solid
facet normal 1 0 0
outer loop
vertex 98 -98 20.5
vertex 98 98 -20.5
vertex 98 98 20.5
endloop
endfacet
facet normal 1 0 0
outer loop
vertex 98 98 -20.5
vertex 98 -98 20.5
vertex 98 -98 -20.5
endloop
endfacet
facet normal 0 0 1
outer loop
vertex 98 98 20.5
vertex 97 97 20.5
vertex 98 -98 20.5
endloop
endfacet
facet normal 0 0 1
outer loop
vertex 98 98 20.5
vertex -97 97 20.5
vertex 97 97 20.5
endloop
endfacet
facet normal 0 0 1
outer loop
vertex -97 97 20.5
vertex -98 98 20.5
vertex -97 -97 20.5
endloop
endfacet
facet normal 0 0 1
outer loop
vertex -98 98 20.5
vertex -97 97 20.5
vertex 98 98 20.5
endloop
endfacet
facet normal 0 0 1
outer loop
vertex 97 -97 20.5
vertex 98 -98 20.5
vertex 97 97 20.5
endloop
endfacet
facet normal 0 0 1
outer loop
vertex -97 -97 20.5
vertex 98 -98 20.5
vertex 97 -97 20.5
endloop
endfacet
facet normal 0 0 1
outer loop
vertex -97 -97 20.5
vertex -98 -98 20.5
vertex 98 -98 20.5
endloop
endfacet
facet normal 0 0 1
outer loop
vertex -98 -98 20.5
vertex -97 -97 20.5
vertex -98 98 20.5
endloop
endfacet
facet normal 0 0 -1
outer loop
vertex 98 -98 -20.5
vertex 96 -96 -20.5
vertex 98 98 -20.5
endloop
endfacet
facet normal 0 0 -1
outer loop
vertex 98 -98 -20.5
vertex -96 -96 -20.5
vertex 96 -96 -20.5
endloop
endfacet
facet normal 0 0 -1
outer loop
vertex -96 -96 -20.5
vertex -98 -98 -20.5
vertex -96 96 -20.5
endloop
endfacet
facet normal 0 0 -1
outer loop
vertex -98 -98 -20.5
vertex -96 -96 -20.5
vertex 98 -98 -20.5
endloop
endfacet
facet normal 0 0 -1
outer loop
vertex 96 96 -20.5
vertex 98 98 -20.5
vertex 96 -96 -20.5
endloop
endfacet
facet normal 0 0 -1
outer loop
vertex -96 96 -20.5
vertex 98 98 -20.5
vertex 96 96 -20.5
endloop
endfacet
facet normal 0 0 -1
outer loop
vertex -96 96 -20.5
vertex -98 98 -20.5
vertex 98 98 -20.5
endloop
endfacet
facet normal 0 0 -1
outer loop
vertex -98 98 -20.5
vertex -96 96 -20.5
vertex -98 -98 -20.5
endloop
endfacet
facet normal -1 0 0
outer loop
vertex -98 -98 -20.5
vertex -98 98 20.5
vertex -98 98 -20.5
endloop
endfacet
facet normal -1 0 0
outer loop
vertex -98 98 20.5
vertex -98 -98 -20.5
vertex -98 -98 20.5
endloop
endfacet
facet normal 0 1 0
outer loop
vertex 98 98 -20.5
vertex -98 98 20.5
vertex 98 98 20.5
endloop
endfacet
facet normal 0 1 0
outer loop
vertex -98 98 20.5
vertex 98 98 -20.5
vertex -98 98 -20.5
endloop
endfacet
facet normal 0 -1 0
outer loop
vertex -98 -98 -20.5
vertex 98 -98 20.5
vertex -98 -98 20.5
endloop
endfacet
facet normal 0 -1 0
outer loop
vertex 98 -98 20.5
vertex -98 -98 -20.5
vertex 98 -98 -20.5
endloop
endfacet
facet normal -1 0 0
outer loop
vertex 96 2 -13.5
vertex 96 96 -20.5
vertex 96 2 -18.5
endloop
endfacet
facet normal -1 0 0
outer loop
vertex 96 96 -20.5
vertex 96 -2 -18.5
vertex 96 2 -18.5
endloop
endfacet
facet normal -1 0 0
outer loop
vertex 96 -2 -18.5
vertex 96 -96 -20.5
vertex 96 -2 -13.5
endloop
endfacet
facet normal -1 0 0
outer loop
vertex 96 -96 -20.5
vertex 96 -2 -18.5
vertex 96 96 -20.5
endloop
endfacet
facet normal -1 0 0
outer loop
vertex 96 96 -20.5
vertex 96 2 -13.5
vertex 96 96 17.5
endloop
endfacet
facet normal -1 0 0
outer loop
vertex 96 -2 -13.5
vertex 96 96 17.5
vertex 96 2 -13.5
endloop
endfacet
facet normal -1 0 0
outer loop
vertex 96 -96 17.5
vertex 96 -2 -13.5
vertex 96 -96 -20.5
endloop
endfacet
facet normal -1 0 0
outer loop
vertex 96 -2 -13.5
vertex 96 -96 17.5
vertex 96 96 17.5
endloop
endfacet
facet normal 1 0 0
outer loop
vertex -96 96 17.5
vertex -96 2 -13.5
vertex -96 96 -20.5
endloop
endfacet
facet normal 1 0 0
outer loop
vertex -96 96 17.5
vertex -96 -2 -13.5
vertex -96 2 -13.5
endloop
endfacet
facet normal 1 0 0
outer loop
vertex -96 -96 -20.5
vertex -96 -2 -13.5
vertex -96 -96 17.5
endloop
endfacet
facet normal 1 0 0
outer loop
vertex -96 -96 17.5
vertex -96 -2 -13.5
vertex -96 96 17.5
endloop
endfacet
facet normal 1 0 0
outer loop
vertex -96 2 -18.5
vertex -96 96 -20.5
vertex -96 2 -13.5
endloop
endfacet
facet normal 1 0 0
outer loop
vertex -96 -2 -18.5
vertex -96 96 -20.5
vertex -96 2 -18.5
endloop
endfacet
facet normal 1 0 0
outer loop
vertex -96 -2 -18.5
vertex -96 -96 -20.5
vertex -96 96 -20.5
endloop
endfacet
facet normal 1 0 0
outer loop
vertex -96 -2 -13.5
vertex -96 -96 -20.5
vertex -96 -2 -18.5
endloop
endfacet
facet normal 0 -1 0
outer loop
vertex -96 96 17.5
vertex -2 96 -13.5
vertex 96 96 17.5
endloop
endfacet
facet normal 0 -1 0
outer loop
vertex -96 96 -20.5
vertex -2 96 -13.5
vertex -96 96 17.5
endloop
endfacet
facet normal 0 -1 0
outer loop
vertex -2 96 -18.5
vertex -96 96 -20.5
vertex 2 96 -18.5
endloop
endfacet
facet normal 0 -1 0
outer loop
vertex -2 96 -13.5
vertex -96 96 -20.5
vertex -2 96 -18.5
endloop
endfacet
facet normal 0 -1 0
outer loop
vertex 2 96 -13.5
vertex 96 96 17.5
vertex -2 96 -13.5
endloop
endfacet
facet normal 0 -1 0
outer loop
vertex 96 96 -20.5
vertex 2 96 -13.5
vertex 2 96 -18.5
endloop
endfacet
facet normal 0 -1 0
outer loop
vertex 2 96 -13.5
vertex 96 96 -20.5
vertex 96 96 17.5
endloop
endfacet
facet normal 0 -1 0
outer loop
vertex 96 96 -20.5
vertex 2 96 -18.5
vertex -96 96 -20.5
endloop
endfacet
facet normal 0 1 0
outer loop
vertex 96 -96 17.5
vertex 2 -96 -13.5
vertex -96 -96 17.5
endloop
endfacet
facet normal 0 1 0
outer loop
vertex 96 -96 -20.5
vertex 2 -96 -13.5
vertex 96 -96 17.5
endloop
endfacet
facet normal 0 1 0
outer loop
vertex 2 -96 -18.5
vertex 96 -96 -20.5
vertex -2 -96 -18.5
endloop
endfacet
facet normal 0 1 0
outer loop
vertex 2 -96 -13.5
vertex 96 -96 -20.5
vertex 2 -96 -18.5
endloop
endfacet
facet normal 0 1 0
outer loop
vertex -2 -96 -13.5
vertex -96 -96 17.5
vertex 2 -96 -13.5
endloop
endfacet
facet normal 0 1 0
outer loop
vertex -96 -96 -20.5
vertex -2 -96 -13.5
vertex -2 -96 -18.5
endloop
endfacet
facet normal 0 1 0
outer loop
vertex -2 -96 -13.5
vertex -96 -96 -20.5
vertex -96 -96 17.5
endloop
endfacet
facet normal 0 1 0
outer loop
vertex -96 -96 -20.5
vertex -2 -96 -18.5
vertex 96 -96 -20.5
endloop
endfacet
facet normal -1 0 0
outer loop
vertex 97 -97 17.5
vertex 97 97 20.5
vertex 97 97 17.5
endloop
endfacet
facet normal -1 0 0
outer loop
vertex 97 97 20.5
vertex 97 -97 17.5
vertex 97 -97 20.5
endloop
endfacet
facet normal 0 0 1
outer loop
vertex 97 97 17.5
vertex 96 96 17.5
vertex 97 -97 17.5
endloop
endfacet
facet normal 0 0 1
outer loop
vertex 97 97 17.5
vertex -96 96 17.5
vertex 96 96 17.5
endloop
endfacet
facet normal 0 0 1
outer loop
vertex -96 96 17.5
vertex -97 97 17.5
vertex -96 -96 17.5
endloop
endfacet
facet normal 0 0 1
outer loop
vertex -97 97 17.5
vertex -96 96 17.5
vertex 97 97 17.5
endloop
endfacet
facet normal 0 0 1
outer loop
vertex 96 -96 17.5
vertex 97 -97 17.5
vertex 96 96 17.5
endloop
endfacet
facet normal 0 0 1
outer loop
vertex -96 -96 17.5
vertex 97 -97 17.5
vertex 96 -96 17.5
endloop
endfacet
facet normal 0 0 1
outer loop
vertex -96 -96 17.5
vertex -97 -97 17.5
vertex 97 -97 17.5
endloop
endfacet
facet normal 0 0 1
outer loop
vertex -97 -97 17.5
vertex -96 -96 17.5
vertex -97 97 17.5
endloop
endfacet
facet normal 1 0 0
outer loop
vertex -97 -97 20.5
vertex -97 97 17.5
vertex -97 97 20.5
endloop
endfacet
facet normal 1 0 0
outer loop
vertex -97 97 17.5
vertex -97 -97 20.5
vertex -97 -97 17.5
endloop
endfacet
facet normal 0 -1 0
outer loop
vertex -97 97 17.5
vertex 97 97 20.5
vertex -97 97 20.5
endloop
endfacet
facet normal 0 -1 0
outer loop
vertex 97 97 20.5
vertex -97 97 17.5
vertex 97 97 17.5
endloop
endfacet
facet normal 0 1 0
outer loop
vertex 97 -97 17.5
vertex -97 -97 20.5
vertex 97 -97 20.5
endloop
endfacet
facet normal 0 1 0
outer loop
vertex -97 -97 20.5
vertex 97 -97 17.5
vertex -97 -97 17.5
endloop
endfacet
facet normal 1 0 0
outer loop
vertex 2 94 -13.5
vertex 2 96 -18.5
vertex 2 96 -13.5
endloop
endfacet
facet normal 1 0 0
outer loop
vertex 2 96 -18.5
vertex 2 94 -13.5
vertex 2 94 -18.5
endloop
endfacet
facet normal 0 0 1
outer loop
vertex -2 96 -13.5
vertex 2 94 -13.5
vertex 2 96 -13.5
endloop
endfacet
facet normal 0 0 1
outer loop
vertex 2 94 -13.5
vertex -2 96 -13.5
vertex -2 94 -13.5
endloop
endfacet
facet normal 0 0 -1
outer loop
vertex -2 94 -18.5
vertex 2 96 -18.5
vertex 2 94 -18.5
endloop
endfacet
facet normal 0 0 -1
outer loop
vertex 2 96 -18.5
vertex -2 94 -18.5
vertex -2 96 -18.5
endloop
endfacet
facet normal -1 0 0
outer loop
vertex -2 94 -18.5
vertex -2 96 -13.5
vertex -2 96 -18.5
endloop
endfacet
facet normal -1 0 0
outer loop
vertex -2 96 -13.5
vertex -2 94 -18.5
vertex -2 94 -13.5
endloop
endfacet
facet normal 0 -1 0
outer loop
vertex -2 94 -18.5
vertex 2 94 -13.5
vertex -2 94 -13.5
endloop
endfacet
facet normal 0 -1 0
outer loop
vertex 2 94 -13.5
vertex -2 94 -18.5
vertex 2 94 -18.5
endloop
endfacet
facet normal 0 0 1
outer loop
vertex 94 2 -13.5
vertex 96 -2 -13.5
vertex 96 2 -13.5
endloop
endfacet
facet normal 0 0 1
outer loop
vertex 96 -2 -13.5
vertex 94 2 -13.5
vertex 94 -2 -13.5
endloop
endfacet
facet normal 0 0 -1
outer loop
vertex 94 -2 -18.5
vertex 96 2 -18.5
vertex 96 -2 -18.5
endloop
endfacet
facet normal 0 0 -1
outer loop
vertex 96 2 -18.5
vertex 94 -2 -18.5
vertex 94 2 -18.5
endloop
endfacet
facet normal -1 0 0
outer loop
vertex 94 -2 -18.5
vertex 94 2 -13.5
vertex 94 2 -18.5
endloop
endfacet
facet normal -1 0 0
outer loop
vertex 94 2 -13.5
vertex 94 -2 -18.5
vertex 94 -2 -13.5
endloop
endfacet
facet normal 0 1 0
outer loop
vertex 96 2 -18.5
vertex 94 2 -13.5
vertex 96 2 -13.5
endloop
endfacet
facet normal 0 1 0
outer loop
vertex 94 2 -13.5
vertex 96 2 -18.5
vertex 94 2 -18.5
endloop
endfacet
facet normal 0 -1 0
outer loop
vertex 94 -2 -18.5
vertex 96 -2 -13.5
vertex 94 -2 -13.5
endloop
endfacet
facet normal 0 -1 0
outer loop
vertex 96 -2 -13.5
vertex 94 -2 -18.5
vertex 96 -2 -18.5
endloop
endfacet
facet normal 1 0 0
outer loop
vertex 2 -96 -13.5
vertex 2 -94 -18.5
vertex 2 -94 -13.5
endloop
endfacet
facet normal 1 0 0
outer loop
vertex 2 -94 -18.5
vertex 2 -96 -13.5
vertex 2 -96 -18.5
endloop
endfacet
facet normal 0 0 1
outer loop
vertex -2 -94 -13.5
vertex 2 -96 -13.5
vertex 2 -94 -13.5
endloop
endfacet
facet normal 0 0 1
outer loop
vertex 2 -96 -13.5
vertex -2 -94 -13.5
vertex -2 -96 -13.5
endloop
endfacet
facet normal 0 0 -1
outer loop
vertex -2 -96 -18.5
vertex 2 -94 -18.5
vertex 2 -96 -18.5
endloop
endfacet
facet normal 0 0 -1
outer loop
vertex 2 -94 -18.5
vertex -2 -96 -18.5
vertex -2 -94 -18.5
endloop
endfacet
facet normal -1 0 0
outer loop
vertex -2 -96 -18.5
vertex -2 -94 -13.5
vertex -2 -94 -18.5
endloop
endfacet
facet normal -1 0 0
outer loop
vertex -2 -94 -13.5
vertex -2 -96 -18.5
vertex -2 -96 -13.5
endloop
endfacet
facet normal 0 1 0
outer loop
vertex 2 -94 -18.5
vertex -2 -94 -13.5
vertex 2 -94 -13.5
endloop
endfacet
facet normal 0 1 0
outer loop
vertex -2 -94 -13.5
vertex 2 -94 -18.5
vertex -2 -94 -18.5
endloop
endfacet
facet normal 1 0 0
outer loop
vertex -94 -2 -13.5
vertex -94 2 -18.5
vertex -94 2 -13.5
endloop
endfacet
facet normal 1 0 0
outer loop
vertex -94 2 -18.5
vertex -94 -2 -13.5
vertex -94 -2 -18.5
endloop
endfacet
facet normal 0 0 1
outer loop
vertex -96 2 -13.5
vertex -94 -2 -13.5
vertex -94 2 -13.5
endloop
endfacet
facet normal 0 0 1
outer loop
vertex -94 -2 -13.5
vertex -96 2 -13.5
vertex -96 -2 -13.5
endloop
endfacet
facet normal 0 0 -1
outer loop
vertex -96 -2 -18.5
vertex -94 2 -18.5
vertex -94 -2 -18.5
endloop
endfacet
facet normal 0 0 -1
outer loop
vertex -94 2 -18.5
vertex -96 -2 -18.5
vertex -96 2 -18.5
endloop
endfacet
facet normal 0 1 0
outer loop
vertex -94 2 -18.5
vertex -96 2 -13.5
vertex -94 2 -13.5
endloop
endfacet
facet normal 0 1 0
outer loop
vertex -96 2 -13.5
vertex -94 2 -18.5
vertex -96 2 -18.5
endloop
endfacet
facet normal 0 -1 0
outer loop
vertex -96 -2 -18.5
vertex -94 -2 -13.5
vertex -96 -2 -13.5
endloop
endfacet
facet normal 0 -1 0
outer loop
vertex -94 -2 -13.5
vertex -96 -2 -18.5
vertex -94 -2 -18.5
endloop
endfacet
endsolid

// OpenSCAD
t = 2;
inner = 192;
outer = inner + 2*t;
frame = 14; // thickness of the led frame
relief = 7; // distance from the back of the led frame to the back of the box
glass_t = 3;
stop_pos = frame + 20; //distance of the back of the display to the front of the glass 
box_depth = stop_pos + relief; // full depth of the box

module sides () {difference (){
    cube([outer,outer,box_depth],center = true);
    cube([inner, inner,box_depth*2],center = true); // full hole
}
}

module sides_front_back() {
    difference() {
    sides();
    translate([0,0,box_depth/2-glass_t/2]) cube([inner+t,inner+t,glass_t],center=true);
//    translate([-outer/2+t/2,0,0]) cube([t,inner+t,inner+t],center=true);
}
}

module stop() {
    cube([4,4,5],center = true);
}

module box() {union() {
    sides_front_back();
    translate([0,inner/2,box_depth/2-2.5-stop_pos]) stop();
    translate([inner/2,0,box_depth/2-2.5-stop_pos]) stop();
    translate([0,-inner/2,box_depth/2-2.5-stop_pos]) stop();
    translate([-inner/2,0,box_depth/2-2.5-stop_pos]) stop();
}}

box();
